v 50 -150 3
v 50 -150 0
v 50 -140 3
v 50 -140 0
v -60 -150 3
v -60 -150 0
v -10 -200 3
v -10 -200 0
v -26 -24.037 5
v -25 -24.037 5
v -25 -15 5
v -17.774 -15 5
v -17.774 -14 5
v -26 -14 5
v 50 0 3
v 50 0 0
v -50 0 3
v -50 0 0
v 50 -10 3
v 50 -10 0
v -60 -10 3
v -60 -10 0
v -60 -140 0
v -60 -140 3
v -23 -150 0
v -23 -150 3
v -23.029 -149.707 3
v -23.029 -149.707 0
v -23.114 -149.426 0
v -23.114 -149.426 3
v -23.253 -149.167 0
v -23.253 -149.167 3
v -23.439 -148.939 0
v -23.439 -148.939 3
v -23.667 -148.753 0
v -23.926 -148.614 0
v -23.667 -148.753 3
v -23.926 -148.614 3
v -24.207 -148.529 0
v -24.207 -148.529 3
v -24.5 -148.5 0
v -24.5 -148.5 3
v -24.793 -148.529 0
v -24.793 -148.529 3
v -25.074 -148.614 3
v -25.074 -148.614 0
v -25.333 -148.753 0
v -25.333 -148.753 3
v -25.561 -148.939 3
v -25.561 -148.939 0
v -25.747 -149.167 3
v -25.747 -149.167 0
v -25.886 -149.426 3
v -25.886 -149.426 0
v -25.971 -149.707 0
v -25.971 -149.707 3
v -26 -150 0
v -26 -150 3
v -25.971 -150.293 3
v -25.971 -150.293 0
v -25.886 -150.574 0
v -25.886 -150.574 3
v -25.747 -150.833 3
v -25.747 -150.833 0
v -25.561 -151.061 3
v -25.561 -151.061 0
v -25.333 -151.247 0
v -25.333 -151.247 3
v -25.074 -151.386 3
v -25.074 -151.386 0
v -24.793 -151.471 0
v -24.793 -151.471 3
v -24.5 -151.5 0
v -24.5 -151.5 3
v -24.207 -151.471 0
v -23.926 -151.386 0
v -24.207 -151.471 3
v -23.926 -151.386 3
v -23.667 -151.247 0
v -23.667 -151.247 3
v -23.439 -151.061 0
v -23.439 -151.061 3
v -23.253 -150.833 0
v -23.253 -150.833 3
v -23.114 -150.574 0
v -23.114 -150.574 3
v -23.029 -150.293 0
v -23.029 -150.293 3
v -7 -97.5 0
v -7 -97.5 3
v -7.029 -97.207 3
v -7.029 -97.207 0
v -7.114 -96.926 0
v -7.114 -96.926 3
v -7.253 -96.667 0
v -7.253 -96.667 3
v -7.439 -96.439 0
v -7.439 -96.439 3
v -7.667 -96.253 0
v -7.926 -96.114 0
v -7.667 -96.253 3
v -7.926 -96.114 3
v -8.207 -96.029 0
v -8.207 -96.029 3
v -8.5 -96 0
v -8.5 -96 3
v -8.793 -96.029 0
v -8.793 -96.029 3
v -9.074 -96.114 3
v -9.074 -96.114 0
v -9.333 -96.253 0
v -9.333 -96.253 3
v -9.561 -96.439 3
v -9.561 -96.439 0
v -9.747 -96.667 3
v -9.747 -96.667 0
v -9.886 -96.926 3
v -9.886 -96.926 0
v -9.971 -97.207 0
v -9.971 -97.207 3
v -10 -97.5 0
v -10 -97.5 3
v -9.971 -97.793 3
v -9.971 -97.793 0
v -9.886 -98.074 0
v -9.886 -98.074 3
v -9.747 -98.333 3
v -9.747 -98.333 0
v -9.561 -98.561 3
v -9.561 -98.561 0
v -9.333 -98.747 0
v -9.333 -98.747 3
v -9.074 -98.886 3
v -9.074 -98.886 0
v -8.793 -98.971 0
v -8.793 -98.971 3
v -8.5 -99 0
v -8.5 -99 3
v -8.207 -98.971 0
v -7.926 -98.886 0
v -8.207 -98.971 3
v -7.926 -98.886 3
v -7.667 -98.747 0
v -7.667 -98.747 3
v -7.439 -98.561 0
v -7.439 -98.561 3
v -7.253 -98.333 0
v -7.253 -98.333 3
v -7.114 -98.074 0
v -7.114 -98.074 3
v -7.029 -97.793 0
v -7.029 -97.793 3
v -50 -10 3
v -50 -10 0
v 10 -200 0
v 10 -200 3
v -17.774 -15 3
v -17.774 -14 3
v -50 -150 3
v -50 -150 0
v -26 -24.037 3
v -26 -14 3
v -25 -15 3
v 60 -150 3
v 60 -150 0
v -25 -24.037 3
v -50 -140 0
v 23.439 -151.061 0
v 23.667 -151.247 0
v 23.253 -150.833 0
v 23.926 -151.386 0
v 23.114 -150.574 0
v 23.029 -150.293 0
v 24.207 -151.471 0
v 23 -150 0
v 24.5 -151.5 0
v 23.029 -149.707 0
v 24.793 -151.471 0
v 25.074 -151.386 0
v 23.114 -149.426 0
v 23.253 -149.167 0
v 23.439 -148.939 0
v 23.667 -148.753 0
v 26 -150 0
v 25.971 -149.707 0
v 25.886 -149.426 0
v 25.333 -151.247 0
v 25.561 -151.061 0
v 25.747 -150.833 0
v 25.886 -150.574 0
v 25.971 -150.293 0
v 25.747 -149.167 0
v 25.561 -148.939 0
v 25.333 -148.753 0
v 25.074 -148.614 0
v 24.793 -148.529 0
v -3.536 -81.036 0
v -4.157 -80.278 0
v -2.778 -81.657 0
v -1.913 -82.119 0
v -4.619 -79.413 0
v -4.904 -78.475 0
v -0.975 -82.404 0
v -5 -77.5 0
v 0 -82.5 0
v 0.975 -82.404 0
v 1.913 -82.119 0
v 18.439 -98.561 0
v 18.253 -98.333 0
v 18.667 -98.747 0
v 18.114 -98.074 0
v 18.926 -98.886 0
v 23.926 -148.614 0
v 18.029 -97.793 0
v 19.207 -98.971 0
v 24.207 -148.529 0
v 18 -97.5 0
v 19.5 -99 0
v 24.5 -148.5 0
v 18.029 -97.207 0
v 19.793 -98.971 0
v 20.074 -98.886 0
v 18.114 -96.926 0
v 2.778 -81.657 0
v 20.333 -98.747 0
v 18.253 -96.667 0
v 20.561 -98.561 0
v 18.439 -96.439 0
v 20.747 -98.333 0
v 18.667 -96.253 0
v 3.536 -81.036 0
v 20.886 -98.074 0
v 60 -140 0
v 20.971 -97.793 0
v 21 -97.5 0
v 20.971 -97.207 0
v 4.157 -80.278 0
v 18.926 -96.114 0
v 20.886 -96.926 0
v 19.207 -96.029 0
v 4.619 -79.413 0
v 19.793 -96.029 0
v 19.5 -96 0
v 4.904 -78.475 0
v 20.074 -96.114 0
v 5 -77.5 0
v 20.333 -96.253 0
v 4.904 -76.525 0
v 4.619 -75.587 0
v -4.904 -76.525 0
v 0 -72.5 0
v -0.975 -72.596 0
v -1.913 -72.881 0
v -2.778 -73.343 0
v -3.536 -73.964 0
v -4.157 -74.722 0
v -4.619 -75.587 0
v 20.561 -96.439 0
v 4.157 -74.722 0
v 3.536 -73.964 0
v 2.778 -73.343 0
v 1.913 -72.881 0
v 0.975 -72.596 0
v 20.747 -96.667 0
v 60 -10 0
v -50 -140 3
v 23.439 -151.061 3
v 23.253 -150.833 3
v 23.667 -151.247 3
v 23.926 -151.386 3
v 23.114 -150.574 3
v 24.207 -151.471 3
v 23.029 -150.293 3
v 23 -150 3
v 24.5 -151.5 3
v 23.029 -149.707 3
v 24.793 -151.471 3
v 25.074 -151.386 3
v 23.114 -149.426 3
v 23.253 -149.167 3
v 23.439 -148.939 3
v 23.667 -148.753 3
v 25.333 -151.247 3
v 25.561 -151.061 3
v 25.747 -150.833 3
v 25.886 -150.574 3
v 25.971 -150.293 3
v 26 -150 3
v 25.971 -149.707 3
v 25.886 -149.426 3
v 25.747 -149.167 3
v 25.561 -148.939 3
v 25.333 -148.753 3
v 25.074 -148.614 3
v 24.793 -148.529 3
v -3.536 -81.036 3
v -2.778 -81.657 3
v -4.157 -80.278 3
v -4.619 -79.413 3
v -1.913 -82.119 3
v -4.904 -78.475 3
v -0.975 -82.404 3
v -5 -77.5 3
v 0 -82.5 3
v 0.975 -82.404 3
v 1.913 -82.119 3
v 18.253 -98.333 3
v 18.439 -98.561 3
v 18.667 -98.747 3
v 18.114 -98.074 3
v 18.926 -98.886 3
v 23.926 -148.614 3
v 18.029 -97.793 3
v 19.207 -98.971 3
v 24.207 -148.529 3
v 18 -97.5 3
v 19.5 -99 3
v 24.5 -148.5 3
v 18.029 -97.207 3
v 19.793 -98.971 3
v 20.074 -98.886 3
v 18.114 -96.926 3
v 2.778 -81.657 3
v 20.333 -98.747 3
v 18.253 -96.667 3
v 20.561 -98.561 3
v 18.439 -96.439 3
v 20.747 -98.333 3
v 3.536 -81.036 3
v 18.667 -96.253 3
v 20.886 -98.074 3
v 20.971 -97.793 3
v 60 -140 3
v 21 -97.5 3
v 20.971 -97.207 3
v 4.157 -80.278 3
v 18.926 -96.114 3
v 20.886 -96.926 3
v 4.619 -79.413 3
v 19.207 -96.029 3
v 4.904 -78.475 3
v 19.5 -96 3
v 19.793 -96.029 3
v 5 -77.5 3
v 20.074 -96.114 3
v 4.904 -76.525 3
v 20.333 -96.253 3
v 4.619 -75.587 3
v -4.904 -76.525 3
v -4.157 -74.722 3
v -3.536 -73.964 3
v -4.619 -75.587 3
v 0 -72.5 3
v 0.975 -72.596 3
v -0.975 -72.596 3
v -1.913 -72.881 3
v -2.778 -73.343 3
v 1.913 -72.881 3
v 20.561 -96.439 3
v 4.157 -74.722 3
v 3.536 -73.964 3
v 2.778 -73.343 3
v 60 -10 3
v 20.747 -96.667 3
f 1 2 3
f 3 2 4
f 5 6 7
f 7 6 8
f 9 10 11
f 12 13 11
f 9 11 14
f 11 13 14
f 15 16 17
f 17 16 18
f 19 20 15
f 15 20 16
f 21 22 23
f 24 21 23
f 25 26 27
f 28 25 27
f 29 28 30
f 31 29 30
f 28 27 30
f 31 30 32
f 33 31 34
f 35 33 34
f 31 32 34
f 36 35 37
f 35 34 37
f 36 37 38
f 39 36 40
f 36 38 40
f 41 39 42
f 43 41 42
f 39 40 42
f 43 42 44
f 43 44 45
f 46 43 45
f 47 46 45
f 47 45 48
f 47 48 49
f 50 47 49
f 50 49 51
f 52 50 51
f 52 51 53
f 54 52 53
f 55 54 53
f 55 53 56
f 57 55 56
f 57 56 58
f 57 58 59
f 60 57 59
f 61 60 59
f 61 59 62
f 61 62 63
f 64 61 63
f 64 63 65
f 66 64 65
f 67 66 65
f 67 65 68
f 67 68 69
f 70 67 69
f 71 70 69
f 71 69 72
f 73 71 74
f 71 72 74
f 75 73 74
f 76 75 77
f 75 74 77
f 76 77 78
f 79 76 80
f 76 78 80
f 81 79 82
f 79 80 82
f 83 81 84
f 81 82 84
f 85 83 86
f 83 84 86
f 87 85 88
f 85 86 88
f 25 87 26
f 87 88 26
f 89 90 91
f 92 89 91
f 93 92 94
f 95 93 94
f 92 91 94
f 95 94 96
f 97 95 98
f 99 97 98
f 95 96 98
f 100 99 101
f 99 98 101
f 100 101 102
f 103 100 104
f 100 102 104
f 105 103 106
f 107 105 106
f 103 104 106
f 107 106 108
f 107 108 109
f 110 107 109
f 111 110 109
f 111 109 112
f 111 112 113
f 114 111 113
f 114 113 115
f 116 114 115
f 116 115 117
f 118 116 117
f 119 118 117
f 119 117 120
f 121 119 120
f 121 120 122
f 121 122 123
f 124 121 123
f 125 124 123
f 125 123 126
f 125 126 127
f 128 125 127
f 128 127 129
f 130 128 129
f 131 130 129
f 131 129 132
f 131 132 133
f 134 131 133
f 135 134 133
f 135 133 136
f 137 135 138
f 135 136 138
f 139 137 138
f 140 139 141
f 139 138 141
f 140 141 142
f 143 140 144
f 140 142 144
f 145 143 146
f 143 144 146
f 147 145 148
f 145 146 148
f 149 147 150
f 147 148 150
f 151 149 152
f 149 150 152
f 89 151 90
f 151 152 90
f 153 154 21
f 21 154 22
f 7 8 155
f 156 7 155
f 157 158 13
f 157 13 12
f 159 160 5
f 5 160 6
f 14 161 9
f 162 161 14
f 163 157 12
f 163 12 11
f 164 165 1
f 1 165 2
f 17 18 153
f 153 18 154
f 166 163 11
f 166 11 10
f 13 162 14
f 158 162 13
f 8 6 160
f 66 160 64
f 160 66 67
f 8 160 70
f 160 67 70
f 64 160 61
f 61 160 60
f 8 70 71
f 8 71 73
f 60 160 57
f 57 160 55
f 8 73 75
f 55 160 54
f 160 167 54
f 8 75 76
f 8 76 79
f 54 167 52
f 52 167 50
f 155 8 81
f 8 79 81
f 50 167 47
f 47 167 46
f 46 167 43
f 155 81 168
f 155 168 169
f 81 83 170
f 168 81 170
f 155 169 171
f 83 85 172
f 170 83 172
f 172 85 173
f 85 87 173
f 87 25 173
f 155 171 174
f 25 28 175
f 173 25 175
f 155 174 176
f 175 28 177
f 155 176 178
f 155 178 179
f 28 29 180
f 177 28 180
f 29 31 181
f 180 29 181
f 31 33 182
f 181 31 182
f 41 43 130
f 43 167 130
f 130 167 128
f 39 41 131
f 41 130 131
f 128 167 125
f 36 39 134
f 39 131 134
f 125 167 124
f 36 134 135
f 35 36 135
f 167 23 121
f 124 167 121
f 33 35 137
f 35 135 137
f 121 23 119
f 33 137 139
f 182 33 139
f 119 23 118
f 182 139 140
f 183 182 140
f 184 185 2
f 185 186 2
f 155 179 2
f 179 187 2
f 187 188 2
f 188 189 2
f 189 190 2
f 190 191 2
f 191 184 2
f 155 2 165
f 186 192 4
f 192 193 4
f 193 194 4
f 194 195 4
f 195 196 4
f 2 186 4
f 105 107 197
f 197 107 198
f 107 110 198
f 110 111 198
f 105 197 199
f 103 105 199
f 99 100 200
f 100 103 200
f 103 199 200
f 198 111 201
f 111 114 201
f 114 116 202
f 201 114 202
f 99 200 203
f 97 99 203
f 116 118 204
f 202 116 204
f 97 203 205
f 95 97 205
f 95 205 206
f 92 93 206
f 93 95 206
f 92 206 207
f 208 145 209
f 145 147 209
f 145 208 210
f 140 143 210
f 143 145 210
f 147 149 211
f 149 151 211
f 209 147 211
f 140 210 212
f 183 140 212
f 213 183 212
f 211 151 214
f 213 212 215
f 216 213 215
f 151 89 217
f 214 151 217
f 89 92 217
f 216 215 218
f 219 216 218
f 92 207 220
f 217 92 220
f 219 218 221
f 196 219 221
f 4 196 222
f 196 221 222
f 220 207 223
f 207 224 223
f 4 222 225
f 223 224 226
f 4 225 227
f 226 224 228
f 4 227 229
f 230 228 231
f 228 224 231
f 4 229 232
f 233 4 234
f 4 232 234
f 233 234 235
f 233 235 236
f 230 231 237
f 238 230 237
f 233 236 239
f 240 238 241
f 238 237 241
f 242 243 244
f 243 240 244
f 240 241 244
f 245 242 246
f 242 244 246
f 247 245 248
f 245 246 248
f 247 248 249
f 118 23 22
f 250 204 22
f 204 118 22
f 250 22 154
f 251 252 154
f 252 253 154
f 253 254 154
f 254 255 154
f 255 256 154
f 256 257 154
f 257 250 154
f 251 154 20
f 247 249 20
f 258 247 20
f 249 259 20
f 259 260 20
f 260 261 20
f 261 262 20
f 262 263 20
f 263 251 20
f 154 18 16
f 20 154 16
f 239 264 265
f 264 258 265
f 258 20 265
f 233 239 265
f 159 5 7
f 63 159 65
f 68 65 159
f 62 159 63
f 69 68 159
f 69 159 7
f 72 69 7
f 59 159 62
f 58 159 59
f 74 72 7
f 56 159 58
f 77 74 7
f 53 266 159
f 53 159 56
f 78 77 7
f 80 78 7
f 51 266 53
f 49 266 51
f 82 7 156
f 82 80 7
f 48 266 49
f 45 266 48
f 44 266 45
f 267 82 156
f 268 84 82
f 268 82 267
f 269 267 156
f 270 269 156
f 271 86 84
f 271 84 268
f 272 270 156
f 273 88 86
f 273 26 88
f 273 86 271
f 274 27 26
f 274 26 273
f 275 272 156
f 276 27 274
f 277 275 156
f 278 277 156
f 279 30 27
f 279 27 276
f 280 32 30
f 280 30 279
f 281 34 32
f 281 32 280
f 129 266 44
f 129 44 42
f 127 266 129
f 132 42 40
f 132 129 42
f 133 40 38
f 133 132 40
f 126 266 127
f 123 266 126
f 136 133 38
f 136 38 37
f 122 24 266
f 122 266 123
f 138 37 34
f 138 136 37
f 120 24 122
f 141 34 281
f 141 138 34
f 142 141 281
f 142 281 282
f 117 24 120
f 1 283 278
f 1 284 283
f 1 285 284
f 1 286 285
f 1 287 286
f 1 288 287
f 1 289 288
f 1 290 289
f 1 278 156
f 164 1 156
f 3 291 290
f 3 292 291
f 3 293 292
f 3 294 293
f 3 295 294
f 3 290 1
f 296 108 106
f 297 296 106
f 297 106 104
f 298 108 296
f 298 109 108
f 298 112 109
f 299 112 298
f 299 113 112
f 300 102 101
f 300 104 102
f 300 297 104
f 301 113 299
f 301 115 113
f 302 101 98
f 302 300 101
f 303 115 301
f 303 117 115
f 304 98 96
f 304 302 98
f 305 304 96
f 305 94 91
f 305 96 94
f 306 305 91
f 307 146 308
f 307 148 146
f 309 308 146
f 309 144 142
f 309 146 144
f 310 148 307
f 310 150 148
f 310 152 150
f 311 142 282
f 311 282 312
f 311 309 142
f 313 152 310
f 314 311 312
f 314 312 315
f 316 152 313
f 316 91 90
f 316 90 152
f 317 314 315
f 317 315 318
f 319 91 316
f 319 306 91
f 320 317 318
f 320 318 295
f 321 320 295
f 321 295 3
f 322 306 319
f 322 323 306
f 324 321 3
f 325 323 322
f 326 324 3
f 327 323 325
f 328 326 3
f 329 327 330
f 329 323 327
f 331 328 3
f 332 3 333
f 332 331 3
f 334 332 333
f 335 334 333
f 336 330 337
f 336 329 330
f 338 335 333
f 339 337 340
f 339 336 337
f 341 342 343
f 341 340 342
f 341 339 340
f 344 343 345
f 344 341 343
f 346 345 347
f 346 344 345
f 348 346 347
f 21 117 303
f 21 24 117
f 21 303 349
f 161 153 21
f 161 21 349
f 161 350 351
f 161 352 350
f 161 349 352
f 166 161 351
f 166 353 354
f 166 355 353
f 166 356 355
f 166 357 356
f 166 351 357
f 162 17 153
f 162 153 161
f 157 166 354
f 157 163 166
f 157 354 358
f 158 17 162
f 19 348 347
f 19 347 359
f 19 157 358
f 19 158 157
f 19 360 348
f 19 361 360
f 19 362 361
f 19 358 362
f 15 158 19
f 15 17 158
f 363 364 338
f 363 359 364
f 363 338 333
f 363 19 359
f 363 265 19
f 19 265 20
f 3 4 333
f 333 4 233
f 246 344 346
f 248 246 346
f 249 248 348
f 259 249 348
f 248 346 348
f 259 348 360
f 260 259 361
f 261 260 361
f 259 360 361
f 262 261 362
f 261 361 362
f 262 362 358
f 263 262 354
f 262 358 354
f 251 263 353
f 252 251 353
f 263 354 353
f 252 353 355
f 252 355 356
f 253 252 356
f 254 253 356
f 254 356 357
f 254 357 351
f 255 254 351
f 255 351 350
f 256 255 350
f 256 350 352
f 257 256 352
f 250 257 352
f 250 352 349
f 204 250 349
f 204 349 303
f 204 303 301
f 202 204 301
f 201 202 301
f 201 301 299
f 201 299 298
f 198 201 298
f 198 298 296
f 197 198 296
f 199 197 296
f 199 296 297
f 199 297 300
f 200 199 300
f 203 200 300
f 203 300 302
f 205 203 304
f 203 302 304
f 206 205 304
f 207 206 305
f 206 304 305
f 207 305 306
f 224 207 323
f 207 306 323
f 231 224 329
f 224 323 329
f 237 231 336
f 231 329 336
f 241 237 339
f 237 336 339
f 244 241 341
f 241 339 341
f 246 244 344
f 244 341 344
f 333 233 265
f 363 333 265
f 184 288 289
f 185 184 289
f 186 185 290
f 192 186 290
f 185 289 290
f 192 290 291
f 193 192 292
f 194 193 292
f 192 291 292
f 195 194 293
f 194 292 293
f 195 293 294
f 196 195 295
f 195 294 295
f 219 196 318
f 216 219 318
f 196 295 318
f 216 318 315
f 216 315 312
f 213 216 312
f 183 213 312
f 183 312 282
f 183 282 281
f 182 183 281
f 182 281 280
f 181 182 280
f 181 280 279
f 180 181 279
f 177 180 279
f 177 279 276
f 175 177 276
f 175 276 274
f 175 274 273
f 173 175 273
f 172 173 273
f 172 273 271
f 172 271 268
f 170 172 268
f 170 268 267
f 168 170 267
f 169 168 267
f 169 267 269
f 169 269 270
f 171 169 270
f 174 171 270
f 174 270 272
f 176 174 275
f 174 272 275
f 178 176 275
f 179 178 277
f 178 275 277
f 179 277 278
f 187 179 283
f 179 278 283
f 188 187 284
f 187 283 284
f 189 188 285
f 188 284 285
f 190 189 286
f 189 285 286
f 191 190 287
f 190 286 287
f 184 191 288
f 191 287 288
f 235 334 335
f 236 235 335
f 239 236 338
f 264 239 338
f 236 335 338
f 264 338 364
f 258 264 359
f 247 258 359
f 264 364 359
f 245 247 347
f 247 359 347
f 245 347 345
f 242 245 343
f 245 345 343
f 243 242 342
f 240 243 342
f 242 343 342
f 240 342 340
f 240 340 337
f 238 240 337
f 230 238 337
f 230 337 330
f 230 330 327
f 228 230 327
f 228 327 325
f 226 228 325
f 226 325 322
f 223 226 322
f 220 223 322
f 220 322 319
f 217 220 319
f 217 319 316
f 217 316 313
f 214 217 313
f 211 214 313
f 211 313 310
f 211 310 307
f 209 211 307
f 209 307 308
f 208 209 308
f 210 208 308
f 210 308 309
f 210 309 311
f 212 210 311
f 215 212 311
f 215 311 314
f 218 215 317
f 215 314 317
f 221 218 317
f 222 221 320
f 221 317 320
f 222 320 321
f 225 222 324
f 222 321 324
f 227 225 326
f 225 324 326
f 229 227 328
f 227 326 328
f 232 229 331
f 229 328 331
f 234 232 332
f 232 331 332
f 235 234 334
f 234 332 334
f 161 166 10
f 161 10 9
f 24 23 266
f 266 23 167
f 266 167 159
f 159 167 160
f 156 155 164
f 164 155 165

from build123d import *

# Parameters (mm, degrees)
EXTRUSION1_DEPTH        = 3
ESQUISSE2_R             = 1.5
ENL_V_MAT_EXTRU_1_DEPTH = 10
EXTRUSION2_DEPTH        = 2
ESQUISSE4_R             = 5
ENL_V_MAT_EXTRU_2_DEPTH = 52


with BuildPart() as part:
    # Esquisse1 → Extrusion1 (new body)
    with BuildSketch(Plane.XY):
        Polygon((50, 0), (-50, 0), (-50, -10), (-60, -10), (-60, -140), (-50, -140), (-50, -150), (-60, -150), (-10, -200), (10, -200), (60, -150), (50, -150), (50, -140), (60, -140), (60, -10), (50, -10), align=None)
    extrude(amount=EXTRUSION1_DEPTH)

    # Esquisse2 → Enlèv. mat.-Extru.1 (cut)
    with BuildSketch(Plane.XY.offset(3)):
        with Locations((-24.5, -150)):
            Circle(ESQUISSE2_R)
        with Locations((-8.5, -97.5)):
            Circle(ESQUISSE2_R)
        with Locations((19.5, -97.5)):
            Circle(ESQUISSE2_R)
        with Locations((24.5, -150)):
            Circle(ESQUISSE2_R)
    extrude(amount=-ENL_V_MAT_EXTRU_1_DEPTH, mode=Mode.SUBTRACT)

    # Esquisse3 → Extrusion2 (add)
    with BuildSketch(Plane.XY.offset(3)):
        Polygon((-25, -15), (-25, -24.03748446), (-26, -24.03748446), (-26, -14), (-17.773776224, -14), (-17.773776224, -15), align=None)
    extrude(amount=EXTRUSION2_DEPTH)

    # Esquisse4 → Enlèv. mat.-Extru.2 (cut)
    with BuildSketch(Plane.XY.offset(3)):
        with Locations((0, -77.5)):
            Circle(ESQUISSE4_R)
    extrude(amount=-ENL_V_MAT_EXTRU_2_DEPTH, mode=Mode.SUBTRACT)


solid = part.part
